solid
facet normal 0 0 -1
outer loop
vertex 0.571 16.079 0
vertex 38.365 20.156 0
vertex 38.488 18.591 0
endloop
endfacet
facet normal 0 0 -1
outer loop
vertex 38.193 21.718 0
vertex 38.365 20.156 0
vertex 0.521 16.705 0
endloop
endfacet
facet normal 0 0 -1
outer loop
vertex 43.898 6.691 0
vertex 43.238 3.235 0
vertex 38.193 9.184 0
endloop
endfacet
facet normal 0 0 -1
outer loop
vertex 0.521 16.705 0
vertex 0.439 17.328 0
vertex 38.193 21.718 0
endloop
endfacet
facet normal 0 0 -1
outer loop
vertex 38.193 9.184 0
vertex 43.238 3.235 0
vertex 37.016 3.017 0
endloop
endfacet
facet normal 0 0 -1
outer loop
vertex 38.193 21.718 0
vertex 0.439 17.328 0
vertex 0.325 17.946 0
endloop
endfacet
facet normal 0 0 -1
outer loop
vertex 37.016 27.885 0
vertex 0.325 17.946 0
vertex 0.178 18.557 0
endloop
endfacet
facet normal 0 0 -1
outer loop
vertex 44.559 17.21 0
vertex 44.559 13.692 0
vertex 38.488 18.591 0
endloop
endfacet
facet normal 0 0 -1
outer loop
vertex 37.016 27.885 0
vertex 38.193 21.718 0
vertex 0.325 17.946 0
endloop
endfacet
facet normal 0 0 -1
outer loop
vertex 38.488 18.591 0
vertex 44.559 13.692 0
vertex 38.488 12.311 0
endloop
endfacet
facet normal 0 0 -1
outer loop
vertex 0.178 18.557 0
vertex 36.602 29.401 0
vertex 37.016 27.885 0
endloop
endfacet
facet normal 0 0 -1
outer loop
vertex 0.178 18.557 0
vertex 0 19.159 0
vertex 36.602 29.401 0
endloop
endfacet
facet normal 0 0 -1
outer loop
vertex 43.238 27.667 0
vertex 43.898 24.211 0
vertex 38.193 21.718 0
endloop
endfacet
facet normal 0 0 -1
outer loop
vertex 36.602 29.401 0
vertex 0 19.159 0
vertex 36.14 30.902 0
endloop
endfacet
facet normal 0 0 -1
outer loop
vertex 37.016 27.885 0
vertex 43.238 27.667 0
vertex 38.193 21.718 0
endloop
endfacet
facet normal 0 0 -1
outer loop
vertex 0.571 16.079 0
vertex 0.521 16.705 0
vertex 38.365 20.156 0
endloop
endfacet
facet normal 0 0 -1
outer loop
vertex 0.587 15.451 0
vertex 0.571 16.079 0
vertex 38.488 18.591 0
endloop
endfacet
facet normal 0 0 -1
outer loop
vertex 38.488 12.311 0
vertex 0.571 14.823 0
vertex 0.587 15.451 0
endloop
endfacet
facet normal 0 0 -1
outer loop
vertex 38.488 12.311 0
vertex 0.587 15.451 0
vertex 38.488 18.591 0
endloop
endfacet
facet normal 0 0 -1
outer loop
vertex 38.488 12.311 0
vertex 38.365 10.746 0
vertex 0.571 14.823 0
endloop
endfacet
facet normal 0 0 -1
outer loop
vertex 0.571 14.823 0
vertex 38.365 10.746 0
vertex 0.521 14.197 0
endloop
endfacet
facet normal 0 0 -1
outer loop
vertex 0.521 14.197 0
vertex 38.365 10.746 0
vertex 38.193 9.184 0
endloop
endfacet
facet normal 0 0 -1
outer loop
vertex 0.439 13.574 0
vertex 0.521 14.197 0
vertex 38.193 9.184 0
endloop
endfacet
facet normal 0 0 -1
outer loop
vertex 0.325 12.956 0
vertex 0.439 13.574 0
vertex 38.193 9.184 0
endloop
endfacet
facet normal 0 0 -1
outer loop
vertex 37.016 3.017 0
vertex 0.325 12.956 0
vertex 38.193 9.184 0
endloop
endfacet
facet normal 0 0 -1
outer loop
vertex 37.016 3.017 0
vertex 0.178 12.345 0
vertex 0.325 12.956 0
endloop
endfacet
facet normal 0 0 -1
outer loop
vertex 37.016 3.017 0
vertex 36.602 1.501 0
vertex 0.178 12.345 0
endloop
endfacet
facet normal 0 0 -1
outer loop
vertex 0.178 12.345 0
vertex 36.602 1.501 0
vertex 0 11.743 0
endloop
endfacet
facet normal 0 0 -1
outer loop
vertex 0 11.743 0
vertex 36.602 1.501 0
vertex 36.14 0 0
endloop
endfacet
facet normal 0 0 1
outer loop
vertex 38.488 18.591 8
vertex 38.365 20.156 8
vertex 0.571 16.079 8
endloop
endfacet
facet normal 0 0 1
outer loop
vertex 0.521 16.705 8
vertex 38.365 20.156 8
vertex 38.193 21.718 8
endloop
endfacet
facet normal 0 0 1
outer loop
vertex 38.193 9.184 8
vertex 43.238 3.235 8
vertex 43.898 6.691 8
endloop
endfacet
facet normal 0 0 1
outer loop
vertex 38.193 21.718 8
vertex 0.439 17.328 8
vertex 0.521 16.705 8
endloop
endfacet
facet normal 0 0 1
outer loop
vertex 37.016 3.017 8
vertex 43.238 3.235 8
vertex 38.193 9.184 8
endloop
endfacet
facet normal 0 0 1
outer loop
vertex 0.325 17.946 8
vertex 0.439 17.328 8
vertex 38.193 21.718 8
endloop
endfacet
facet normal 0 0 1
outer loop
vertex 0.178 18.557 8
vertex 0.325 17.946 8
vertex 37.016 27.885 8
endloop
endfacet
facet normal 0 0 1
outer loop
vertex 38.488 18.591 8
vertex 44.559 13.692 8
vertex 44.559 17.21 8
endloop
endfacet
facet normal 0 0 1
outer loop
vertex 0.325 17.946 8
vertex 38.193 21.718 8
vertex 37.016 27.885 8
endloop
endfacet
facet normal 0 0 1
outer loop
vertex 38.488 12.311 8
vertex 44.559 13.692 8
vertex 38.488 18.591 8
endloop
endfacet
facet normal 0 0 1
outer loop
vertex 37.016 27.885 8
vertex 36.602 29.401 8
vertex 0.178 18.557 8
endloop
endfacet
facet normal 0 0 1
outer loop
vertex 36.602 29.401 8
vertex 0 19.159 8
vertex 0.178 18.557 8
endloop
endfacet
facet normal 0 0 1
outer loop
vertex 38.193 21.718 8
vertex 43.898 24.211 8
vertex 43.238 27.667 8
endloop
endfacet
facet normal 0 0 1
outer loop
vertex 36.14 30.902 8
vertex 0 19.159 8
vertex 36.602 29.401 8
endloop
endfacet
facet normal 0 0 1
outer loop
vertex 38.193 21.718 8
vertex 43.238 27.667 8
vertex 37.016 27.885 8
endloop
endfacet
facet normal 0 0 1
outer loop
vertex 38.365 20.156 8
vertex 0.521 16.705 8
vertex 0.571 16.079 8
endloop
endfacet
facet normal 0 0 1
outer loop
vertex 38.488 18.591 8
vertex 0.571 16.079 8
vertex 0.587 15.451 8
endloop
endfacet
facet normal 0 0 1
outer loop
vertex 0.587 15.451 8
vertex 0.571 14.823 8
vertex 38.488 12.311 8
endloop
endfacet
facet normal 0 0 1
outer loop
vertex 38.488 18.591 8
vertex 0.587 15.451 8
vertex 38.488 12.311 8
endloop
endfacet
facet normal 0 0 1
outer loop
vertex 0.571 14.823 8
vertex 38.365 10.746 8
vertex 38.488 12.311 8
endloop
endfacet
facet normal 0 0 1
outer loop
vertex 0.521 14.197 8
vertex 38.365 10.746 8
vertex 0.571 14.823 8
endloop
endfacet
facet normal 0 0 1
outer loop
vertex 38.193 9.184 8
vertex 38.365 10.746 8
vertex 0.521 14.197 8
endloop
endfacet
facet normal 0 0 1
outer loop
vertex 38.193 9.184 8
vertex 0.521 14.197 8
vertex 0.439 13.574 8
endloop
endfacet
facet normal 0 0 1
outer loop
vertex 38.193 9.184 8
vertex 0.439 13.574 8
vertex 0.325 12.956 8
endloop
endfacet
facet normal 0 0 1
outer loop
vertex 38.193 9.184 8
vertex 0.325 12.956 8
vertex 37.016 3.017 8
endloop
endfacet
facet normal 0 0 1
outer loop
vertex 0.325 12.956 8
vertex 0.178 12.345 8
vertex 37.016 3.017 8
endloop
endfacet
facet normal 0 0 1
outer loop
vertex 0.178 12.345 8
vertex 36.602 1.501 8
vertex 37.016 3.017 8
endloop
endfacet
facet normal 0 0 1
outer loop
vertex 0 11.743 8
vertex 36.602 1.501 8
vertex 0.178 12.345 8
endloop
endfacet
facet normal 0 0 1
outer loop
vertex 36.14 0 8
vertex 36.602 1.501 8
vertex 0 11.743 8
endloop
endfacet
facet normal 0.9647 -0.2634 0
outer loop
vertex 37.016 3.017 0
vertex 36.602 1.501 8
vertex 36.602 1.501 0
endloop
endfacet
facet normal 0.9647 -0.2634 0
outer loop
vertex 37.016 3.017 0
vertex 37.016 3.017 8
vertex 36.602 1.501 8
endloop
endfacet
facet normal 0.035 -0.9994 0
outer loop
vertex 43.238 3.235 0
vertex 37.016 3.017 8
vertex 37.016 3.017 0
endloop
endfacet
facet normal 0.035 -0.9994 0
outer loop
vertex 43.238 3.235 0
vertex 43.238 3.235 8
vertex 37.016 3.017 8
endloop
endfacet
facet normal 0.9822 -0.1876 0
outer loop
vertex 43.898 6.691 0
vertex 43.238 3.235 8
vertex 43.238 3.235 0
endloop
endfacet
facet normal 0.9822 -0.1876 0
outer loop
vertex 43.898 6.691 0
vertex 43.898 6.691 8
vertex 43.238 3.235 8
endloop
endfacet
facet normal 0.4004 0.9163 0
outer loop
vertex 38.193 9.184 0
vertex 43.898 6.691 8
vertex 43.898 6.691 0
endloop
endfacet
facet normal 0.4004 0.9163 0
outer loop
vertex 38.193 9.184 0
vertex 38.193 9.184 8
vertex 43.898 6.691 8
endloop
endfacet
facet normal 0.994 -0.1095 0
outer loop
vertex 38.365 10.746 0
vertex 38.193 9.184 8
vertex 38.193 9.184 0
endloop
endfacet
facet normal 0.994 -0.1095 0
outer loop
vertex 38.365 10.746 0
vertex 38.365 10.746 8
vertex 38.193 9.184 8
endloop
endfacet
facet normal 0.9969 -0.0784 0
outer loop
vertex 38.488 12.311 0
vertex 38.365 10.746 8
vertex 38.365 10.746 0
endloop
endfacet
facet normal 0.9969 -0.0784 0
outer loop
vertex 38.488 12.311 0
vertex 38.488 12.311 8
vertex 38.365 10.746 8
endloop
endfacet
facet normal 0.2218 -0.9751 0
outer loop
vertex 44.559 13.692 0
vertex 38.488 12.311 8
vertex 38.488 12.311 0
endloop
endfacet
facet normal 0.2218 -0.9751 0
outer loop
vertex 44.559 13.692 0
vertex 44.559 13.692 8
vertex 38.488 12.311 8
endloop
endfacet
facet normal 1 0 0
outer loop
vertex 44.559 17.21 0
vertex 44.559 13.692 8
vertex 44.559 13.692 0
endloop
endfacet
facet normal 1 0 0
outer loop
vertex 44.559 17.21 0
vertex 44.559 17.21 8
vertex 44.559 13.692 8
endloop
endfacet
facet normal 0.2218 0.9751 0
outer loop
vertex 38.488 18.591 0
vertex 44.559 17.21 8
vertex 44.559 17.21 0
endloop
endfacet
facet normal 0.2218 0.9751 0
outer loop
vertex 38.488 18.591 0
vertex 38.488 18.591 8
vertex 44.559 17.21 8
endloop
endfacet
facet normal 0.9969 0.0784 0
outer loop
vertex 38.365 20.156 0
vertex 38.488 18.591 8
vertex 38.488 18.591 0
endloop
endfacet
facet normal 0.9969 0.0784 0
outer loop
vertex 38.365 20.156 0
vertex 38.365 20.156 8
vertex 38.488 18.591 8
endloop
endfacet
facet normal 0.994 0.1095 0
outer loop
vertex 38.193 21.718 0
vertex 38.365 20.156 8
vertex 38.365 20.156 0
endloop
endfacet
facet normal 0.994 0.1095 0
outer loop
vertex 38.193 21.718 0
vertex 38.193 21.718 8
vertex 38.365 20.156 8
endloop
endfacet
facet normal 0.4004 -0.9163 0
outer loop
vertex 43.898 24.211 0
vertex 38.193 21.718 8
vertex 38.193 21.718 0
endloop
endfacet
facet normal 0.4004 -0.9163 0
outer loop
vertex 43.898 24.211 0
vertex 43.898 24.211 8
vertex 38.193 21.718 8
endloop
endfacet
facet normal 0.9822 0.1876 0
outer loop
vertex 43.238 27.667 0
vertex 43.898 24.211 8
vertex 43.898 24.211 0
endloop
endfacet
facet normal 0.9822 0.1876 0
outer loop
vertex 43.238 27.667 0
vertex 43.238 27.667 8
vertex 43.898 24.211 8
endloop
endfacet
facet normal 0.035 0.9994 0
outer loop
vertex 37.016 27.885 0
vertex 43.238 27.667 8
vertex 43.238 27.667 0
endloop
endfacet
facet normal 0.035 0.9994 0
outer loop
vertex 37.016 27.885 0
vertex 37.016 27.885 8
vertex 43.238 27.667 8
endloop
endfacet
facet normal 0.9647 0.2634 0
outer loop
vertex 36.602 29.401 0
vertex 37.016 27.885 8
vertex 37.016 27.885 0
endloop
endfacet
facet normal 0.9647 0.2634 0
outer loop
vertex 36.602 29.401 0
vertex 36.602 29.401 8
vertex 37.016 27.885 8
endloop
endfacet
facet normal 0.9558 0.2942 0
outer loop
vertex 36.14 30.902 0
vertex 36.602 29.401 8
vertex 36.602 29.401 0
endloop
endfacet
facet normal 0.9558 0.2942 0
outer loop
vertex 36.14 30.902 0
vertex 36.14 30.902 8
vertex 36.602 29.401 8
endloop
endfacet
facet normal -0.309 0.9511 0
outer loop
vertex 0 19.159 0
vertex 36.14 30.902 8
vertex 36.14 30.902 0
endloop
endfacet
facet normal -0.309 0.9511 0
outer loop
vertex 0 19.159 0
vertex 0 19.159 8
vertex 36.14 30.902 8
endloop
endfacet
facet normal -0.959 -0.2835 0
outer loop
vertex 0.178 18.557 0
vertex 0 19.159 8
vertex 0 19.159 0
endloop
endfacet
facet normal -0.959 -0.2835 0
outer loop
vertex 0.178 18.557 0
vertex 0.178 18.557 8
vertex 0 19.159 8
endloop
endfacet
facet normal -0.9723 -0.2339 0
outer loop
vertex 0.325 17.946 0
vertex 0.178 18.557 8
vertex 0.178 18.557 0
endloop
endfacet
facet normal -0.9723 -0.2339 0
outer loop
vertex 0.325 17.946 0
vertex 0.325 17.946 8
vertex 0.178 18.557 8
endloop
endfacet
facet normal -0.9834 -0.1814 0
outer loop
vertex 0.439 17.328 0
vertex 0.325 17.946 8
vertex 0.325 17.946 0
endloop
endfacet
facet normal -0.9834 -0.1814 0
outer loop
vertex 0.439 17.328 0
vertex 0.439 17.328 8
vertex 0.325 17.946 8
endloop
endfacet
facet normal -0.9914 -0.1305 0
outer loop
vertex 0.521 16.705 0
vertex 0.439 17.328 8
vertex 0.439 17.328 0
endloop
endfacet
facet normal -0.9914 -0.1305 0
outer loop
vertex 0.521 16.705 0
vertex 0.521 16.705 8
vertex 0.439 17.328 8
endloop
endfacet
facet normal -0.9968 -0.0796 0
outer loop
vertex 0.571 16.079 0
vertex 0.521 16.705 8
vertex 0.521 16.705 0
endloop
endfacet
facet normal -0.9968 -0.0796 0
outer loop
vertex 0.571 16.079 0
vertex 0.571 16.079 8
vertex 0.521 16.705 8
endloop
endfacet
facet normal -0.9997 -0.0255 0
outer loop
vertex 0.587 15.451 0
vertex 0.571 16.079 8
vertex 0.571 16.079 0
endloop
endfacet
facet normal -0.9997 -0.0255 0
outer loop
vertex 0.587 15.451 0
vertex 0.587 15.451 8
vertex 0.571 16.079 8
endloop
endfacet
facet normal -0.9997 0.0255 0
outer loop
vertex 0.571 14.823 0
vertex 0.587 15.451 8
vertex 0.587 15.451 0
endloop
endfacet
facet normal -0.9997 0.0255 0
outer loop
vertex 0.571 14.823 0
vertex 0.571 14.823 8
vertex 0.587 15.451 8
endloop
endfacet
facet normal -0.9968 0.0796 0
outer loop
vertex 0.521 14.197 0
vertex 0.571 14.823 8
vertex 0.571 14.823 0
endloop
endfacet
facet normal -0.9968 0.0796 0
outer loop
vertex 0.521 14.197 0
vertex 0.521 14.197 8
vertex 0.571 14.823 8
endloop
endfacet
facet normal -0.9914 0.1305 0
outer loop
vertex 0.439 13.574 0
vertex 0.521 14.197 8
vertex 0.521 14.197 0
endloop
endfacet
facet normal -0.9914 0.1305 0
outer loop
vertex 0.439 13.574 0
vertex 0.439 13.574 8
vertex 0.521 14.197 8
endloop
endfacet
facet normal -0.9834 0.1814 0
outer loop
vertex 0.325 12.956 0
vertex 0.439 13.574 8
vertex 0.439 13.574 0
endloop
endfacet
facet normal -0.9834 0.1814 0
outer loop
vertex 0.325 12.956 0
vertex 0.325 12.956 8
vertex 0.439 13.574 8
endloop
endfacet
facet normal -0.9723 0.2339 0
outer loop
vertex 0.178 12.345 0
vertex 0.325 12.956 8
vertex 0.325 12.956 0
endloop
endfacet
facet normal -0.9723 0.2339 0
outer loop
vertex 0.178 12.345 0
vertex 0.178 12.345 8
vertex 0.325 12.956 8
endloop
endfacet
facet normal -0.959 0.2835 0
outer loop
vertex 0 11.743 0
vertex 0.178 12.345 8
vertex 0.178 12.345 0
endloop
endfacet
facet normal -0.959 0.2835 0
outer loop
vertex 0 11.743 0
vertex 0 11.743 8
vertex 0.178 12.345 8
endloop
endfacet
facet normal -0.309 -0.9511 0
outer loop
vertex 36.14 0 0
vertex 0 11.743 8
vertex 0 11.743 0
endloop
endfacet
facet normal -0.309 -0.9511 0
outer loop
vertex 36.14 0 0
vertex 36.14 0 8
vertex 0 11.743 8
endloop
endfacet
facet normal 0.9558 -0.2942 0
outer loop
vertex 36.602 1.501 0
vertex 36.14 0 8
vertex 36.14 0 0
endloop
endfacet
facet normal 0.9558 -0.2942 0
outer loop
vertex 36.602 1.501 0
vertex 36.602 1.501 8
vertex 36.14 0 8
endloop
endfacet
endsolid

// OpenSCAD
$fn = 32;

// ----------------------------------------------------------------------
// Gear sector: 3 teeth on 36 degrees
// ----------------------------------------------------------------------

// --- parameters (mm) ---
sector_angle = 36;        // sector angle, degrees
root_r = 50;              // root circle radius
tooth_h = 6;              // tooth height over the root circle
teeth = 3;                // number of teeth on the sector
hub_r = 12;               // hub bore radius
plate_t = 8;              // sector thickness, Z
arc_step = 3;             // sampling step of the root/hub arcs, degrees

tip_r = root_r + tooth_h;  // tip circle radius

profile = [[36.14, 0], [36.602, 1.501], [37.016, 3.017], [43.238, 3.235], [43.898, 6.691], [38.193, 9.184], [38.365, 10.746], [38.488, 12.311], [44.559, 13.692], [44.559, 17.21], [38.488, 18.591], [38.365, 20.156], [38.193, 21.718], [43.898, 24.211], [43.238, 27.667], [37.016, 27.885], [36.602, 29.401], [36.14, 30.902], [0, 19.159], [0.178, 18.557], [0.325, 17.946], [0.439, 17.328], [0.521, 16.705], [0.571, 16.079], [0.587, 15.451], [0.571, 14.823], [0.521, 14.197], [0.439, 13.574], [0.325, 12.956], [0.178, 12.345], [0, 11.743]];  // primary outline, 31 points, counter clockwise

// --- the one profile operation ---
linear_extrude(height = plate_t) polygon(points = profile);
